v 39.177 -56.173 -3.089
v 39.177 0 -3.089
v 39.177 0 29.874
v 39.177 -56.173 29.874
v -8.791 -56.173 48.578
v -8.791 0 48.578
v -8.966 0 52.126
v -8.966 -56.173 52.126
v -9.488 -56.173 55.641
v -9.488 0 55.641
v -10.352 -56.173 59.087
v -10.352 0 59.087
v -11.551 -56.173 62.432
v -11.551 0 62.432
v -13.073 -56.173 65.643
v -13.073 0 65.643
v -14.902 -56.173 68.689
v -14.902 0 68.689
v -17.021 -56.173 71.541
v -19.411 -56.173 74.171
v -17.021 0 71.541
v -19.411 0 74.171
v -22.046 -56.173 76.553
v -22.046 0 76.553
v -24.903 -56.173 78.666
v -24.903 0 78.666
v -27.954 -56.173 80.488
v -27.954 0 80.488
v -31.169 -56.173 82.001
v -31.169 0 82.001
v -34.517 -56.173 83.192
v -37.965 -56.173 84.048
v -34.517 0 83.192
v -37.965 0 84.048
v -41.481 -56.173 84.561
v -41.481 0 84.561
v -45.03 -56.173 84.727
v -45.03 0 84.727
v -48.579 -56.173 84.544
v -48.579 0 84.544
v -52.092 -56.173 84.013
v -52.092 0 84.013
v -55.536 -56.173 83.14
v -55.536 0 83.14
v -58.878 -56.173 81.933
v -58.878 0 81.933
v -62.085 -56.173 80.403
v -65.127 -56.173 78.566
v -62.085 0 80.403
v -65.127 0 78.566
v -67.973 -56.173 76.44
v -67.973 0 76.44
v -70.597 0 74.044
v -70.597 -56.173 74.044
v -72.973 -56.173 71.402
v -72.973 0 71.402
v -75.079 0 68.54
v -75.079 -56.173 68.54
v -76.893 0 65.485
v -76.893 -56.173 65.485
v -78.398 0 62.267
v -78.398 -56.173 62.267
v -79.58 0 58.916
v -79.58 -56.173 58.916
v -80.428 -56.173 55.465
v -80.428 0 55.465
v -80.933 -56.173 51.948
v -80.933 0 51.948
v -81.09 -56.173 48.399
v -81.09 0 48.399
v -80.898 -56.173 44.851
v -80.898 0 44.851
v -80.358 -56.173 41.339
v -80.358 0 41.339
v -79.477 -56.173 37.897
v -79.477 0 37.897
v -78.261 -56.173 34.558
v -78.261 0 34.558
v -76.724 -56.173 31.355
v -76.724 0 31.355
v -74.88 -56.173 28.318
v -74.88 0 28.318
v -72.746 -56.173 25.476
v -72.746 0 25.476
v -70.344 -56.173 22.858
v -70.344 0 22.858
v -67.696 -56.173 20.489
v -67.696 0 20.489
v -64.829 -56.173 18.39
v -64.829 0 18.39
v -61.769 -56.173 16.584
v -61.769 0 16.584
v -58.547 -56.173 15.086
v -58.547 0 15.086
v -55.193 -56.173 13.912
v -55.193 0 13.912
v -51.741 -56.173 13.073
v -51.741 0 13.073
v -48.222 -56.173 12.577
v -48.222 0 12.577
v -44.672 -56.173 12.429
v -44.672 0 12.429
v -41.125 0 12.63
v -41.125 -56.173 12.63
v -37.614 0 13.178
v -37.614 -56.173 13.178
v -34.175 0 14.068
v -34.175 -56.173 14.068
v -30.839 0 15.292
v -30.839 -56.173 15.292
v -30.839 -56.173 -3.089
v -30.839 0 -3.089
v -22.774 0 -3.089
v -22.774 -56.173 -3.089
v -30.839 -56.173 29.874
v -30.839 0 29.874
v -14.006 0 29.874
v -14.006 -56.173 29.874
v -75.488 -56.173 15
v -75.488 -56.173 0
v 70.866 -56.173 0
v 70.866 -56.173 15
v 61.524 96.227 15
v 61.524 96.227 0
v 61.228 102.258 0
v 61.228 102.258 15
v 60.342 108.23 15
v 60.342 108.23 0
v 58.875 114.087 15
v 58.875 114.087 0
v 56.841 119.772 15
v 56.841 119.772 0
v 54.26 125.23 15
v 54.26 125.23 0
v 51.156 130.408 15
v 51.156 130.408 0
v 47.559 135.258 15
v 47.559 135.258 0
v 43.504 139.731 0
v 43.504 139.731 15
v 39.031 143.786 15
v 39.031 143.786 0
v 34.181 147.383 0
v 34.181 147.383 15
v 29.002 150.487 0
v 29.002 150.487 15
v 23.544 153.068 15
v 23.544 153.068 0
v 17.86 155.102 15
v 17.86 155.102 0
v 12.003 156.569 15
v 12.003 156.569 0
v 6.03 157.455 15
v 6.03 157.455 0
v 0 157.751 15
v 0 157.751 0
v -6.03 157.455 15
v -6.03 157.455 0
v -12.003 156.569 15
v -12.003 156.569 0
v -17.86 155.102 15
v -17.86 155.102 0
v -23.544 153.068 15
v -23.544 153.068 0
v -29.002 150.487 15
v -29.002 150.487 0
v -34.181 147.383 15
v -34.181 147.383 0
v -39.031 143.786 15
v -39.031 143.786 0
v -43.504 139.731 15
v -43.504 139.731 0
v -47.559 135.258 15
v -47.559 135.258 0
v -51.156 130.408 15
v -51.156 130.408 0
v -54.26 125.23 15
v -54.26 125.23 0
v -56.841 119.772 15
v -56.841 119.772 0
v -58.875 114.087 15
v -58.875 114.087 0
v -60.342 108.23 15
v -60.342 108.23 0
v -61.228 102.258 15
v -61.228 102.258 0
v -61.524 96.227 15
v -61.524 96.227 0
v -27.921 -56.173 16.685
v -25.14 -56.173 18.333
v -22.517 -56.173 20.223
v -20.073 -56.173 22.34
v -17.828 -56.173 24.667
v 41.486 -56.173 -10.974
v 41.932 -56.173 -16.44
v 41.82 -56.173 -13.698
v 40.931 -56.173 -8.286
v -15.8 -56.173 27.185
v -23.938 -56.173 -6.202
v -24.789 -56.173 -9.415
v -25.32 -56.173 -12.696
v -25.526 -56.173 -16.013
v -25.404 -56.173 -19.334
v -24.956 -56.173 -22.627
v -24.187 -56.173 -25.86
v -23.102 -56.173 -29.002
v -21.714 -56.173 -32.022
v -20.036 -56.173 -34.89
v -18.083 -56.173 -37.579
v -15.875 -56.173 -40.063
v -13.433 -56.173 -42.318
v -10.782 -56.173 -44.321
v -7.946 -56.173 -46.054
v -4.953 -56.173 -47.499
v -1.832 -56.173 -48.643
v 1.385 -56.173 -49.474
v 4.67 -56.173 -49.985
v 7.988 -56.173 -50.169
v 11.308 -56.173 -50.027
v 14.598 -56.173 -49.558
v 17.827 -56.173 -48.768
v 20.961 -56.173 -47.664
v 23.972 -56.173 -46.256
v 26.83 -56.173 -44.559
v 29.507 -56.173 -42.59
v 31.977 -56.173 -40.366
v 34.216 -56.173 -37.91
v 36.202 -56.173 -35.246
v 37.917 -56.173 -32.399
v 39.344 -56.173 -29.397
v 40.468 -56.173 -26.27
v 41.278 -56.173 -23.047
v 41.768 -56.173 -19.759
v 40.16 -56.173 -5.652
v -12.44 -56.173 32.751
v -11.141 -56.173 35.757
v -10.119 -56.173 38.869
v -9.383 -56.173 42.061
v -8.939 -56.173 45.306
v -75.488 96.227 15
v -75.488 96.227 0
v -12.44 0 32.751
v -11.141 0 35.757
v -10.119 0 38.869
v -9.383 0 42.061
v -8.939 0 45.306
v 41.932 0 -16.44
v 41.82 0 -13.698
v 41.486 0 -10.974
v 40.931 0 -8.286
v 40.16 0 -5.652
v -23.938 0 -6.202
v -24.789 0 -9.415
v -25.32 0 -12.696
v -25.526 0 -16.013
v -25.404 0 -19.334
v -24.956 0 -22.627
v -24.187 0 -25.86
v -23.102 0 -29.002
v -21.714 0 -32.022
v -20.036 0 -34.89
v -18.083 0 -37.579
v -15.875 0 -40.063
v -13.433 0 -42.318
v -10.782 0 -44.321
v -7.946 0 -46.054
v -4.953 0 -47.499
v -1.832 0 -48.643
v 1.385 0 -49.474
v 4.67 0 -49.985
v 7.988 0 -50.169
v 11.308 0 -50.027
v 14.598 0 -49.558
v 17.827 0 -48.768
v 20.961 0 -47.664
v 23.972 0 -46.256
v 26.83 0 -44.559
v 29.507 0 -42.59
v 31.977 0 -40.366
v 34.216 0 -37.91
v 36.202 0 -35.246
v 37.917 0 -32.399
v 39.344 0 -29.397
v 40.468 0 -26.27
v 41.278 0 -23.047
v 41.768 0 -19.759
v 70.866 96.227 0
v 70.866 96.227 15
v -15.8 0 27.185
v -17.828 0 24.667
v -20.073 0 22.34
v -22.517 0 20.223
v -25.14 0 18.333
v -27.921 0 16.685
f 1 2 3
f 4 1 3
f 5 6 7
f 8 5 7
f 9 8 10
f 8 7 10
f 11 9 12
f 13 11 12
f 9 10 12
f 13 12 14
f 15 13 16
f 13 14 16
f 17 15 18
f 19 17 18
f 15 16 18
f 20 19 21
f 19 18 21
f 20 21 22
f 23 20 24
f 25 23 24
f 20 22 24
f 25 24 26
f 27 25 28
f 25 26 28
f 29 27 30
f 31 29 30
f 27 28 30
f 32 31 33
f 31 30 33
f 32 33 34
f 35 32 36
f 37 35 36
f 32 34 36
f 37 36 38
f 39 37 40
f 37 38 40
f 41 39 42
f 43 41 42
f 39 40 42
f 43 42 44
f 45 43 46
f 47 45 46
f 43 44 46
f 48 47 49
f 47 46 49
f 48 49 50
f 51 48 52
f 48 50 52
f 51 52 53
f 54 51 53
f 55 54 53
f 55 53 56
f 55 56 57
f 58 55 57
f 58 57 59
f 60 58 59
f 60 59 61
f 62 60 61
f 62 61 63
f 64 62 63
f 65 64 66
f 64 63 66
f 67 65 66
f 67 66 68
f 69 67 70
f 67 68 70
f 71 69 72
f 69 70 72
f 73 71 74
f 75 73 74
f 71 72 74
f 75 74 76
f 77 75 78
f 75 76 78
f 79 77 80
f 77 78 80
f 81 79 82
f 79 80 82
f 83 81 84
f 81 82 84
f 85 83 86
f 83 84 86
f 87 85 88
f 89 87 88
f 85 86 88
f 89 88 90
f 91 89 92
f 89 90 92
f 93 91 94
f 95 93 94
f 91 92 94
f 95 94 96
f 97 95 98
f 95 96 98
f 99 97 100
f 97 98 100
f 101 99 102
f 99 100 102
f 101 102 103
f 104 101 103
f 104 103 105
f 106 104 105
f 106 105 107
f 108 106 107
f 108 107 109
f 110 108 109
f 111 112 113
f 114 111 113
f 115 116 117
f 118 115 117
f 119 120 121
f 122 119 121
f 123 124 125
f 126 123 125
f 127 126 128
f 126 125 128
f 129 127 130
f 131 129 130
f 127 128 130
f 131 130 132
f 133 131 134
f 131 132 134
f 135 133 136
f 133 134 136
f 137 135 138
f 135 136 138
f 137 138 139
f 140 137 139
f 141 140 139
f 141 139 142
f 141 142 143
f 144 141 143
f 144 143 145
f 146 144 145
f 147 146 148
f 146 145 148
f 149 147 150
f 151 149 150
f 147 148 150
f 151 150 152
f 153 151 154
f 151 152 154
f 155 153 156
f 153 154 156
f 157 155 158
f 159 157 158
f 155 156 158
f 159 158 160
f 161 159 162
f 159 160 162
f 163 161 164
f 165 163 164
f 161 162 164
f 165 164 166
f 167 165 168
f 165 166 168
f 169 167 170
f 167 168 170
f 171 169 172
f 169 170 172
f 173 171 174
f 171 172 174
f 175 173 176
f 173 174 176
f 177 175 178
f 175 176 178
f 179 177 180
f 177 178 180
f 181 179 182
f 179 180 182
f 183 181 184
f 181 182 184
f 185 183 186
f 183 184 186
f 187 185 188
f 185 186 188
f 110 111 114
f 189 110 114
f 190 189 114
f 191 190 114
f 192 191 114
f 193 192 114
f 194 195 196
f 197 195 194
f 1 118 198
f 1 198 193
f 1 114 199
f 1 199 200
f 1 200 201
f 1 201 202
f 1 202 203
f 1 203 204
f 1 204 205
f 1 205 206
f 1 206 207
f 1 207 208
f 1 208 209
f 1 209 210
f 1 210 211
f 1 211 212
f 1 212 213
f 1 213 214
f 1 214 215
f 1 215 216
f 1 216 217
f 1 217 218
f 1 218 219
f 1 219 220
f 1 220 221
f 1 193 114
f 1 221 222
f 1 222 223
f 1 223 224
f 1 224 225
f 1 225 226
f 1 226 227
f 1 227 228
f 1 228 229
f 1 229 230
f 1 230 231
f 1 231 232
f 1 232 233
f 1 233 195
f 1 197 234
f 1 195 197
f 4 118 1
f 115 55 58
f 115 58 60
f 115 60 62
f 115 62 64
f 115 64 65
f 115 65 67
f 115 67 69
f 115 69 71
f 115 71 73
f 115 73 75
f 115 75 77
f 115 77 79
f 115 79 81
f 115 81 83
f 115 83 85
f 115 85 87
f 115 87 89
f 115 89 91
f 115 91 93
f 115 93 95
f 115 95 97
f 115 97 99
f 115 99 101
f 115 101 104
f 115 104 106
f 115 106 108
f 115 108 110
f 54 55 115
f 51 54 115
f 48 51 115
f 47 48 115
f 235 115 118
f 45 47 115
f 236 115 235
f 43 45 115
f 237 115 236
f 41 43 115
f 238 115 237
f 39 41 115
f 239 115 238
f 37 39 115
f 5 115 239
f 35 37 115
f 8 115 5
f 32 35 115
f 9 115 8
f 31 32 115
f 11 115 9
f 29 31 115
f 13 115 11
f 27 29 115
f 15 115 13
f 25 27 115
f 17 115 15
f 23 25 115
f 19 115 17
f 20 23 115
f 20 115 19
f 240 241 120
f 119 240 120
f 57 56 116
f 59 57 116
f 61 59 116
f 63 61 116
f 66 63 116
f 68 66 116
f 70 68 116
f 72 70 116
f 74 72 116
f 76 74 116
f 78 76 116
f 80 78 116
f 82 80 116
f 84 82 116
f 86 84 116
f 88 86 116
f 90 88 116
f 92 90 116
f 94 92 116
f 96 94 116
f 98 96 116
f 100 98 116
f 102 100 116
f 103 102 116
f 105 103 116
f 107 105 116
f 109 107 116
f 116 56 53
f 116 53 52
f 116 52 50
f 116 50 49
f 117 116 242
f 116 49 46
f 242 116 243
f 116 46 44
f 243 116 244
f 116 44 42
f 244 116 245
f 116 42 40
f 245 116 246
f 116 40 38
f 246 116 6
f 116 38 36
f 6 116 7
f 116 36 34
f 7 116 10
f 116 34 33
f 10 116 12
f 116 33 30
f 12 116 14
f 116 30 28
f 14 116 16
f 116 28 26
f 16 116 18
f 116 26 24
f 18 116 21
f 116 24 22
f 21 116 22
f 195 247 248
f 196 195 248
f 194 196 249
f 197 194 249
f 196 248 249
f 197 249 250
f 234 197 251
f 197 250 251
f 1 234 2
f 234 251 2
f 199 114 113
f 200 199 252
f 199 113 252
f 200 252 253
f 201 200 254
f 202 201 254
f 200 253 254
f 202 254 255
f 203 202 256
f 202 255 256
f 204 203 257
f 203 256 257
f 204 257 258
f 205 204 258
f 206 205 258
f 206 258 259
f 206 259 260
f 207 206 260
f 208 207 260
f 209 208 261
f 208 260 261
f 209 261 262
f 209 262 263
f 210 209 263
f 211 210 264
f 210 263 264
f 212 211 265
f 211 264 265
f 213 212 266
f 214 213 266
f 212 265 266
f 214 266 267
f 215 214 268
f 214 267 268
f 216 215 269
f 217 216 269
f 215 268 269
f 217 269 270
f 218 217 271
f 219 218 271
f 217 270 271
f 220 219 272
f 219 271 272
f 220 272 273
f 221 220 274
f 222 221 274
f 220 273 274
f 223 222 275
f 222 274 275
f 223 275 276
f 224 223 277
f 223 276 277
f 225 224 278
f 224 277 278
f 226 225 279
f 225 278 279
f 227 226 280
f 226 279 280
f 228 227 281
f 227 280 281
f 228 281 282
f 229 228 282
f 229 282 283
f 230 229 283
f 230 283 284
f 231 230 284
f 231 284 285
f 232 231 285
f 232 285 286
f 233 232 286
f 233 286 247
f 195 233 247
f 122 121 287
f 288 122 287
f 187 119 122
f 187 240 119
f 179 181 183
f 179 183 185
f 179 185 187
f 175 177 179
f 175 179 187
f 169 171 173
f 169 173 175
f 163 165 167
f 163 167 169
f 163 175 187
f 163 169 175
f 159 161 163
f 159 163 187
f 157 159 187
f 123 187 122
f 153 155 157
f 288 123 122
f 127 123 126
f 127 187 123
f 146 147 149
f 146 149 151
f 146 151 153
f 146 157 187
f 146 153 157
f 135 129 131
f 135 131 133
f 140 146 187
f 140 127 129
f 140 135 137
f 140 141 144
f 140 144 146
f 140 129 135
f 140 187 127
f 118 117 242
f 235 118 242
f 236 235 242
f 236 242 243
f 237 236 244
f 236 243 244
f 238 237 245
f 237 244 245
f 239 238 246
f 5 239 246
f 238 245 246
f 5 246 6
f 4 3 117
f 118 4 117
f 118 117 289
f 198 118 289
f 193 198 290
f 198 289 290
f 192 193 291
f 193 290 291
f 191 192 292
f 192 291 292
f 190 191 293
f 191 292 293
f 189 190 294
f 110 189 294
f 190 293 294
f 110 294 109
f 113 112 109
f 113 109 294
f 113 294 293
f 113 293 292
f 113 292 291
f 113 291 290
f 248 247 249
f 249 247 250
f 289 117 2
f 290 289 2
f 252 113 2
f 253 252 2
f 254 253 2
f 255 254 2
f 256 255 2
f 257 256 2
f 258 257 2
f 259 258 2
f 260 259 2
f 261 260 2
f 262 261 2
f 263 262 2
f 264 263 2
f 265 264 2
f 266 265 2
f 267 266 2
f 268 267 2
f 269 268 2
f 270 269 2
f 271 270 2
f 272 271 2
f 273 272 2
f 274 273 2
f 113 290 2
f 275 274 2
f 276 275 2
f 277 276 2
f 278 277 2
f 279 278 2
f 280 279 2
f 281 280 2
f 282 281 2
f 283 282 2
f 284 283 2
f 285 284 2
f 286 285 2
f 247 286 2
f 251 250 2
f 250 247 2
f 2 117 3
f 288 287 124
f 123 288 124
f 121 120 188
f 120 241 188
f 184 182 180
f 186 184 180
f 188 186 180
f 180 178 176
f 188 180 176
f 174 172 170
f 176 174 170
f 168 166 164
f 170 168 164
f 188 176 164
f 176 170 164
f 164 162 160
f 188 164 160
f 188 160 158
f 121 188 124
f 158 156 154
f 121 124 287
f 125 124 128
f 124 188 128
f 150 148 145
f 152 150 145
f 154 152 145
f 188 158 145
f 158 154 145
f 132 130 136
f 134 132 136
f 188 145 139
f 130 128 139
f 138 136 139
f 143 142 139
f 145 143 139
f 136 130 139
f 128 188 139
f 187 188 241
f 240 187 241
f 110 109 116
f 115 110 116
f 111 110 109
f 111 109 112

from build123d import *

# Parameters (mm, degrees)
F1_DEPTH = 15
F3_DEPTH = 56.1727784541


with BuildPart() as f1:
    # F0 (on Top) → F1 (new body)
    with BuildSketch(Plane.XY):
        with BuildLine():
            Line((-75.4883495437, -56.1727784541), (70.8664176497, -56.1727784541))
            Line((70.8664176497, -56.1727784541), (70.8664176497, 96.2272215459))
            Line((70.8664176497, 96.2272215459), (61.5242693467, 96.2272215459))
            ThreePointArc((61.5242693467, 96.2272215459), (0, 34.7029521991), (-61.5242693467, 96.2272215459))
            Line((-61.5242693467, 96.2272215459), (-75.4883495437, 96.2272215459))
            Line((-75.4883495437, 96.2272215459), (-75.4883495437, -56.1727784541))
        make_face()
        with BuildLine():
            Line((-61.5242693467, 96.2272215459), (61.5242693467, 96.2272215459))
            ThreePointArc((61.5242693467, 96.2272215459), (0, 157.7514908926), (-61.5242693467, 96.2272215459))
        make_face()
        with BuildLine():
            ThreePointArc((-61.5242693467, 96.2272215459), (0, 34.7029521991), (61.5242693467, 96.2272215459))
            Line((61.5242693467, 96.2272215459), (-61.5242693467, 96.2272215459))
        make_face()
    extrude(amount=F1_DEPTH)


with BuildPart() as f3:
    # F2 (on Front) → F3 (new body, through all)
    with BuildSketch(Plane.XZ):
        with BuildLine():
            ThreePointArc((-14.0056596662, 29.8738628626), (-10.1190368852, 38.8690121373), (-8.7909689209, 48.5775023699))
            ThreePointArc((-8.7909689209, 48.5775023699), (-75.0785545588, 68.5402217079), (-30.838733539, 15.2918188285))
            Line((-30.838733539, 15.2918188285), (-30.838733539, 29.8738628626))
            Line((-30.838733539, 29.8738628626), (-14.0056596662, 29.8738628626))
        make_face()
    extrude(amount=F3_DEPTH)


with BuildPart() as f3b:
    # F2 (on Front) → F3, piece 2 (new body, through all)
    with BuildSketch(Plane.XZ):
        with BuildLine():
            ThreePointArc((-14.0056596662, 29.8738628626), (-21.2712673338, 21.2542426491), (-30.838733539, 15.2918188285))
            Line((-30.838733539, 15.2918188285), (-30.838733539, 11.3956918838))
            Line((-30.838733539, 11.3956918838), (-10.8487344489, 11.3956918838))
            Line((-10.8487344489, 11.3956918838), (-10.8487344489, 29.8738628626))
            Line((-10.8487344489, 29.8738628626), (-14.0056596662, 29.8738628626))
        make_face()
        with BuildLine():
            Line((39.17702873, 29.8738628626), (-10.8487344489, 29.8738628626))
            Line((-10.8487344489, 29.8738628626), (-10.8487344489, 11.3956918838))
            ThreePointArc((-10.8487344489, 11.3956918838), (17.5826703425, 15.9594720685), (39.17702873, -3.0893219567))
            Line((39.17702873, -3.0893219567), (39.17702873, 29.8738628626))
        make_face()
        with BuildLine():
            Line((-10.8487344489, 11.3956918838), (-30.838733539, 11.3956918838))
            Line((-30.838733539, 11.3956918838), (-30.838733539, -3.0893219567))
            Line((-30.838733539, -3.0893219567), (-22.7742365445, -3.0893219567))
            ThreePointArc((-22.7742365445, -3.0893219567), (-17.8389217221, 4.9990725128), (-10.8487344489, 11.3956918838))
        make_face()
        with BuildLine():
            Line((39.17702873, -3.0893219567), (-22.7742365445, -3.0893219567))
            ThreePointArc((-22.7742365445, -3.0893219567), (1.3854994471, -49.4743007291), (41.931617639, -16.4399035275))
            ThreePointArc((41.931617639, -16.4399035275), (41.2357932944, -9.6240068819), (39.17702873, -3.0893219567))
        make_face()
        with BuildLine():
            ThreePointArc((39.17702873, -3.0893219567), (17.5826703425, 15.9594720685), (-10.8487344489, 11.3956918838))
            ThreePointArc((-10.8487344489, 11.3956918838), (-17.8389217221, 4.9990725128), (-22.7742365445, -3.0893219567))
            Line((-22.7742365445, -3.0893219567), (39.17702873, -3.0893219567))
        make_face()
    extrude(amount=F3_DEPTH)


solid = Compound([f1.part, f3.part, f3b.part])
